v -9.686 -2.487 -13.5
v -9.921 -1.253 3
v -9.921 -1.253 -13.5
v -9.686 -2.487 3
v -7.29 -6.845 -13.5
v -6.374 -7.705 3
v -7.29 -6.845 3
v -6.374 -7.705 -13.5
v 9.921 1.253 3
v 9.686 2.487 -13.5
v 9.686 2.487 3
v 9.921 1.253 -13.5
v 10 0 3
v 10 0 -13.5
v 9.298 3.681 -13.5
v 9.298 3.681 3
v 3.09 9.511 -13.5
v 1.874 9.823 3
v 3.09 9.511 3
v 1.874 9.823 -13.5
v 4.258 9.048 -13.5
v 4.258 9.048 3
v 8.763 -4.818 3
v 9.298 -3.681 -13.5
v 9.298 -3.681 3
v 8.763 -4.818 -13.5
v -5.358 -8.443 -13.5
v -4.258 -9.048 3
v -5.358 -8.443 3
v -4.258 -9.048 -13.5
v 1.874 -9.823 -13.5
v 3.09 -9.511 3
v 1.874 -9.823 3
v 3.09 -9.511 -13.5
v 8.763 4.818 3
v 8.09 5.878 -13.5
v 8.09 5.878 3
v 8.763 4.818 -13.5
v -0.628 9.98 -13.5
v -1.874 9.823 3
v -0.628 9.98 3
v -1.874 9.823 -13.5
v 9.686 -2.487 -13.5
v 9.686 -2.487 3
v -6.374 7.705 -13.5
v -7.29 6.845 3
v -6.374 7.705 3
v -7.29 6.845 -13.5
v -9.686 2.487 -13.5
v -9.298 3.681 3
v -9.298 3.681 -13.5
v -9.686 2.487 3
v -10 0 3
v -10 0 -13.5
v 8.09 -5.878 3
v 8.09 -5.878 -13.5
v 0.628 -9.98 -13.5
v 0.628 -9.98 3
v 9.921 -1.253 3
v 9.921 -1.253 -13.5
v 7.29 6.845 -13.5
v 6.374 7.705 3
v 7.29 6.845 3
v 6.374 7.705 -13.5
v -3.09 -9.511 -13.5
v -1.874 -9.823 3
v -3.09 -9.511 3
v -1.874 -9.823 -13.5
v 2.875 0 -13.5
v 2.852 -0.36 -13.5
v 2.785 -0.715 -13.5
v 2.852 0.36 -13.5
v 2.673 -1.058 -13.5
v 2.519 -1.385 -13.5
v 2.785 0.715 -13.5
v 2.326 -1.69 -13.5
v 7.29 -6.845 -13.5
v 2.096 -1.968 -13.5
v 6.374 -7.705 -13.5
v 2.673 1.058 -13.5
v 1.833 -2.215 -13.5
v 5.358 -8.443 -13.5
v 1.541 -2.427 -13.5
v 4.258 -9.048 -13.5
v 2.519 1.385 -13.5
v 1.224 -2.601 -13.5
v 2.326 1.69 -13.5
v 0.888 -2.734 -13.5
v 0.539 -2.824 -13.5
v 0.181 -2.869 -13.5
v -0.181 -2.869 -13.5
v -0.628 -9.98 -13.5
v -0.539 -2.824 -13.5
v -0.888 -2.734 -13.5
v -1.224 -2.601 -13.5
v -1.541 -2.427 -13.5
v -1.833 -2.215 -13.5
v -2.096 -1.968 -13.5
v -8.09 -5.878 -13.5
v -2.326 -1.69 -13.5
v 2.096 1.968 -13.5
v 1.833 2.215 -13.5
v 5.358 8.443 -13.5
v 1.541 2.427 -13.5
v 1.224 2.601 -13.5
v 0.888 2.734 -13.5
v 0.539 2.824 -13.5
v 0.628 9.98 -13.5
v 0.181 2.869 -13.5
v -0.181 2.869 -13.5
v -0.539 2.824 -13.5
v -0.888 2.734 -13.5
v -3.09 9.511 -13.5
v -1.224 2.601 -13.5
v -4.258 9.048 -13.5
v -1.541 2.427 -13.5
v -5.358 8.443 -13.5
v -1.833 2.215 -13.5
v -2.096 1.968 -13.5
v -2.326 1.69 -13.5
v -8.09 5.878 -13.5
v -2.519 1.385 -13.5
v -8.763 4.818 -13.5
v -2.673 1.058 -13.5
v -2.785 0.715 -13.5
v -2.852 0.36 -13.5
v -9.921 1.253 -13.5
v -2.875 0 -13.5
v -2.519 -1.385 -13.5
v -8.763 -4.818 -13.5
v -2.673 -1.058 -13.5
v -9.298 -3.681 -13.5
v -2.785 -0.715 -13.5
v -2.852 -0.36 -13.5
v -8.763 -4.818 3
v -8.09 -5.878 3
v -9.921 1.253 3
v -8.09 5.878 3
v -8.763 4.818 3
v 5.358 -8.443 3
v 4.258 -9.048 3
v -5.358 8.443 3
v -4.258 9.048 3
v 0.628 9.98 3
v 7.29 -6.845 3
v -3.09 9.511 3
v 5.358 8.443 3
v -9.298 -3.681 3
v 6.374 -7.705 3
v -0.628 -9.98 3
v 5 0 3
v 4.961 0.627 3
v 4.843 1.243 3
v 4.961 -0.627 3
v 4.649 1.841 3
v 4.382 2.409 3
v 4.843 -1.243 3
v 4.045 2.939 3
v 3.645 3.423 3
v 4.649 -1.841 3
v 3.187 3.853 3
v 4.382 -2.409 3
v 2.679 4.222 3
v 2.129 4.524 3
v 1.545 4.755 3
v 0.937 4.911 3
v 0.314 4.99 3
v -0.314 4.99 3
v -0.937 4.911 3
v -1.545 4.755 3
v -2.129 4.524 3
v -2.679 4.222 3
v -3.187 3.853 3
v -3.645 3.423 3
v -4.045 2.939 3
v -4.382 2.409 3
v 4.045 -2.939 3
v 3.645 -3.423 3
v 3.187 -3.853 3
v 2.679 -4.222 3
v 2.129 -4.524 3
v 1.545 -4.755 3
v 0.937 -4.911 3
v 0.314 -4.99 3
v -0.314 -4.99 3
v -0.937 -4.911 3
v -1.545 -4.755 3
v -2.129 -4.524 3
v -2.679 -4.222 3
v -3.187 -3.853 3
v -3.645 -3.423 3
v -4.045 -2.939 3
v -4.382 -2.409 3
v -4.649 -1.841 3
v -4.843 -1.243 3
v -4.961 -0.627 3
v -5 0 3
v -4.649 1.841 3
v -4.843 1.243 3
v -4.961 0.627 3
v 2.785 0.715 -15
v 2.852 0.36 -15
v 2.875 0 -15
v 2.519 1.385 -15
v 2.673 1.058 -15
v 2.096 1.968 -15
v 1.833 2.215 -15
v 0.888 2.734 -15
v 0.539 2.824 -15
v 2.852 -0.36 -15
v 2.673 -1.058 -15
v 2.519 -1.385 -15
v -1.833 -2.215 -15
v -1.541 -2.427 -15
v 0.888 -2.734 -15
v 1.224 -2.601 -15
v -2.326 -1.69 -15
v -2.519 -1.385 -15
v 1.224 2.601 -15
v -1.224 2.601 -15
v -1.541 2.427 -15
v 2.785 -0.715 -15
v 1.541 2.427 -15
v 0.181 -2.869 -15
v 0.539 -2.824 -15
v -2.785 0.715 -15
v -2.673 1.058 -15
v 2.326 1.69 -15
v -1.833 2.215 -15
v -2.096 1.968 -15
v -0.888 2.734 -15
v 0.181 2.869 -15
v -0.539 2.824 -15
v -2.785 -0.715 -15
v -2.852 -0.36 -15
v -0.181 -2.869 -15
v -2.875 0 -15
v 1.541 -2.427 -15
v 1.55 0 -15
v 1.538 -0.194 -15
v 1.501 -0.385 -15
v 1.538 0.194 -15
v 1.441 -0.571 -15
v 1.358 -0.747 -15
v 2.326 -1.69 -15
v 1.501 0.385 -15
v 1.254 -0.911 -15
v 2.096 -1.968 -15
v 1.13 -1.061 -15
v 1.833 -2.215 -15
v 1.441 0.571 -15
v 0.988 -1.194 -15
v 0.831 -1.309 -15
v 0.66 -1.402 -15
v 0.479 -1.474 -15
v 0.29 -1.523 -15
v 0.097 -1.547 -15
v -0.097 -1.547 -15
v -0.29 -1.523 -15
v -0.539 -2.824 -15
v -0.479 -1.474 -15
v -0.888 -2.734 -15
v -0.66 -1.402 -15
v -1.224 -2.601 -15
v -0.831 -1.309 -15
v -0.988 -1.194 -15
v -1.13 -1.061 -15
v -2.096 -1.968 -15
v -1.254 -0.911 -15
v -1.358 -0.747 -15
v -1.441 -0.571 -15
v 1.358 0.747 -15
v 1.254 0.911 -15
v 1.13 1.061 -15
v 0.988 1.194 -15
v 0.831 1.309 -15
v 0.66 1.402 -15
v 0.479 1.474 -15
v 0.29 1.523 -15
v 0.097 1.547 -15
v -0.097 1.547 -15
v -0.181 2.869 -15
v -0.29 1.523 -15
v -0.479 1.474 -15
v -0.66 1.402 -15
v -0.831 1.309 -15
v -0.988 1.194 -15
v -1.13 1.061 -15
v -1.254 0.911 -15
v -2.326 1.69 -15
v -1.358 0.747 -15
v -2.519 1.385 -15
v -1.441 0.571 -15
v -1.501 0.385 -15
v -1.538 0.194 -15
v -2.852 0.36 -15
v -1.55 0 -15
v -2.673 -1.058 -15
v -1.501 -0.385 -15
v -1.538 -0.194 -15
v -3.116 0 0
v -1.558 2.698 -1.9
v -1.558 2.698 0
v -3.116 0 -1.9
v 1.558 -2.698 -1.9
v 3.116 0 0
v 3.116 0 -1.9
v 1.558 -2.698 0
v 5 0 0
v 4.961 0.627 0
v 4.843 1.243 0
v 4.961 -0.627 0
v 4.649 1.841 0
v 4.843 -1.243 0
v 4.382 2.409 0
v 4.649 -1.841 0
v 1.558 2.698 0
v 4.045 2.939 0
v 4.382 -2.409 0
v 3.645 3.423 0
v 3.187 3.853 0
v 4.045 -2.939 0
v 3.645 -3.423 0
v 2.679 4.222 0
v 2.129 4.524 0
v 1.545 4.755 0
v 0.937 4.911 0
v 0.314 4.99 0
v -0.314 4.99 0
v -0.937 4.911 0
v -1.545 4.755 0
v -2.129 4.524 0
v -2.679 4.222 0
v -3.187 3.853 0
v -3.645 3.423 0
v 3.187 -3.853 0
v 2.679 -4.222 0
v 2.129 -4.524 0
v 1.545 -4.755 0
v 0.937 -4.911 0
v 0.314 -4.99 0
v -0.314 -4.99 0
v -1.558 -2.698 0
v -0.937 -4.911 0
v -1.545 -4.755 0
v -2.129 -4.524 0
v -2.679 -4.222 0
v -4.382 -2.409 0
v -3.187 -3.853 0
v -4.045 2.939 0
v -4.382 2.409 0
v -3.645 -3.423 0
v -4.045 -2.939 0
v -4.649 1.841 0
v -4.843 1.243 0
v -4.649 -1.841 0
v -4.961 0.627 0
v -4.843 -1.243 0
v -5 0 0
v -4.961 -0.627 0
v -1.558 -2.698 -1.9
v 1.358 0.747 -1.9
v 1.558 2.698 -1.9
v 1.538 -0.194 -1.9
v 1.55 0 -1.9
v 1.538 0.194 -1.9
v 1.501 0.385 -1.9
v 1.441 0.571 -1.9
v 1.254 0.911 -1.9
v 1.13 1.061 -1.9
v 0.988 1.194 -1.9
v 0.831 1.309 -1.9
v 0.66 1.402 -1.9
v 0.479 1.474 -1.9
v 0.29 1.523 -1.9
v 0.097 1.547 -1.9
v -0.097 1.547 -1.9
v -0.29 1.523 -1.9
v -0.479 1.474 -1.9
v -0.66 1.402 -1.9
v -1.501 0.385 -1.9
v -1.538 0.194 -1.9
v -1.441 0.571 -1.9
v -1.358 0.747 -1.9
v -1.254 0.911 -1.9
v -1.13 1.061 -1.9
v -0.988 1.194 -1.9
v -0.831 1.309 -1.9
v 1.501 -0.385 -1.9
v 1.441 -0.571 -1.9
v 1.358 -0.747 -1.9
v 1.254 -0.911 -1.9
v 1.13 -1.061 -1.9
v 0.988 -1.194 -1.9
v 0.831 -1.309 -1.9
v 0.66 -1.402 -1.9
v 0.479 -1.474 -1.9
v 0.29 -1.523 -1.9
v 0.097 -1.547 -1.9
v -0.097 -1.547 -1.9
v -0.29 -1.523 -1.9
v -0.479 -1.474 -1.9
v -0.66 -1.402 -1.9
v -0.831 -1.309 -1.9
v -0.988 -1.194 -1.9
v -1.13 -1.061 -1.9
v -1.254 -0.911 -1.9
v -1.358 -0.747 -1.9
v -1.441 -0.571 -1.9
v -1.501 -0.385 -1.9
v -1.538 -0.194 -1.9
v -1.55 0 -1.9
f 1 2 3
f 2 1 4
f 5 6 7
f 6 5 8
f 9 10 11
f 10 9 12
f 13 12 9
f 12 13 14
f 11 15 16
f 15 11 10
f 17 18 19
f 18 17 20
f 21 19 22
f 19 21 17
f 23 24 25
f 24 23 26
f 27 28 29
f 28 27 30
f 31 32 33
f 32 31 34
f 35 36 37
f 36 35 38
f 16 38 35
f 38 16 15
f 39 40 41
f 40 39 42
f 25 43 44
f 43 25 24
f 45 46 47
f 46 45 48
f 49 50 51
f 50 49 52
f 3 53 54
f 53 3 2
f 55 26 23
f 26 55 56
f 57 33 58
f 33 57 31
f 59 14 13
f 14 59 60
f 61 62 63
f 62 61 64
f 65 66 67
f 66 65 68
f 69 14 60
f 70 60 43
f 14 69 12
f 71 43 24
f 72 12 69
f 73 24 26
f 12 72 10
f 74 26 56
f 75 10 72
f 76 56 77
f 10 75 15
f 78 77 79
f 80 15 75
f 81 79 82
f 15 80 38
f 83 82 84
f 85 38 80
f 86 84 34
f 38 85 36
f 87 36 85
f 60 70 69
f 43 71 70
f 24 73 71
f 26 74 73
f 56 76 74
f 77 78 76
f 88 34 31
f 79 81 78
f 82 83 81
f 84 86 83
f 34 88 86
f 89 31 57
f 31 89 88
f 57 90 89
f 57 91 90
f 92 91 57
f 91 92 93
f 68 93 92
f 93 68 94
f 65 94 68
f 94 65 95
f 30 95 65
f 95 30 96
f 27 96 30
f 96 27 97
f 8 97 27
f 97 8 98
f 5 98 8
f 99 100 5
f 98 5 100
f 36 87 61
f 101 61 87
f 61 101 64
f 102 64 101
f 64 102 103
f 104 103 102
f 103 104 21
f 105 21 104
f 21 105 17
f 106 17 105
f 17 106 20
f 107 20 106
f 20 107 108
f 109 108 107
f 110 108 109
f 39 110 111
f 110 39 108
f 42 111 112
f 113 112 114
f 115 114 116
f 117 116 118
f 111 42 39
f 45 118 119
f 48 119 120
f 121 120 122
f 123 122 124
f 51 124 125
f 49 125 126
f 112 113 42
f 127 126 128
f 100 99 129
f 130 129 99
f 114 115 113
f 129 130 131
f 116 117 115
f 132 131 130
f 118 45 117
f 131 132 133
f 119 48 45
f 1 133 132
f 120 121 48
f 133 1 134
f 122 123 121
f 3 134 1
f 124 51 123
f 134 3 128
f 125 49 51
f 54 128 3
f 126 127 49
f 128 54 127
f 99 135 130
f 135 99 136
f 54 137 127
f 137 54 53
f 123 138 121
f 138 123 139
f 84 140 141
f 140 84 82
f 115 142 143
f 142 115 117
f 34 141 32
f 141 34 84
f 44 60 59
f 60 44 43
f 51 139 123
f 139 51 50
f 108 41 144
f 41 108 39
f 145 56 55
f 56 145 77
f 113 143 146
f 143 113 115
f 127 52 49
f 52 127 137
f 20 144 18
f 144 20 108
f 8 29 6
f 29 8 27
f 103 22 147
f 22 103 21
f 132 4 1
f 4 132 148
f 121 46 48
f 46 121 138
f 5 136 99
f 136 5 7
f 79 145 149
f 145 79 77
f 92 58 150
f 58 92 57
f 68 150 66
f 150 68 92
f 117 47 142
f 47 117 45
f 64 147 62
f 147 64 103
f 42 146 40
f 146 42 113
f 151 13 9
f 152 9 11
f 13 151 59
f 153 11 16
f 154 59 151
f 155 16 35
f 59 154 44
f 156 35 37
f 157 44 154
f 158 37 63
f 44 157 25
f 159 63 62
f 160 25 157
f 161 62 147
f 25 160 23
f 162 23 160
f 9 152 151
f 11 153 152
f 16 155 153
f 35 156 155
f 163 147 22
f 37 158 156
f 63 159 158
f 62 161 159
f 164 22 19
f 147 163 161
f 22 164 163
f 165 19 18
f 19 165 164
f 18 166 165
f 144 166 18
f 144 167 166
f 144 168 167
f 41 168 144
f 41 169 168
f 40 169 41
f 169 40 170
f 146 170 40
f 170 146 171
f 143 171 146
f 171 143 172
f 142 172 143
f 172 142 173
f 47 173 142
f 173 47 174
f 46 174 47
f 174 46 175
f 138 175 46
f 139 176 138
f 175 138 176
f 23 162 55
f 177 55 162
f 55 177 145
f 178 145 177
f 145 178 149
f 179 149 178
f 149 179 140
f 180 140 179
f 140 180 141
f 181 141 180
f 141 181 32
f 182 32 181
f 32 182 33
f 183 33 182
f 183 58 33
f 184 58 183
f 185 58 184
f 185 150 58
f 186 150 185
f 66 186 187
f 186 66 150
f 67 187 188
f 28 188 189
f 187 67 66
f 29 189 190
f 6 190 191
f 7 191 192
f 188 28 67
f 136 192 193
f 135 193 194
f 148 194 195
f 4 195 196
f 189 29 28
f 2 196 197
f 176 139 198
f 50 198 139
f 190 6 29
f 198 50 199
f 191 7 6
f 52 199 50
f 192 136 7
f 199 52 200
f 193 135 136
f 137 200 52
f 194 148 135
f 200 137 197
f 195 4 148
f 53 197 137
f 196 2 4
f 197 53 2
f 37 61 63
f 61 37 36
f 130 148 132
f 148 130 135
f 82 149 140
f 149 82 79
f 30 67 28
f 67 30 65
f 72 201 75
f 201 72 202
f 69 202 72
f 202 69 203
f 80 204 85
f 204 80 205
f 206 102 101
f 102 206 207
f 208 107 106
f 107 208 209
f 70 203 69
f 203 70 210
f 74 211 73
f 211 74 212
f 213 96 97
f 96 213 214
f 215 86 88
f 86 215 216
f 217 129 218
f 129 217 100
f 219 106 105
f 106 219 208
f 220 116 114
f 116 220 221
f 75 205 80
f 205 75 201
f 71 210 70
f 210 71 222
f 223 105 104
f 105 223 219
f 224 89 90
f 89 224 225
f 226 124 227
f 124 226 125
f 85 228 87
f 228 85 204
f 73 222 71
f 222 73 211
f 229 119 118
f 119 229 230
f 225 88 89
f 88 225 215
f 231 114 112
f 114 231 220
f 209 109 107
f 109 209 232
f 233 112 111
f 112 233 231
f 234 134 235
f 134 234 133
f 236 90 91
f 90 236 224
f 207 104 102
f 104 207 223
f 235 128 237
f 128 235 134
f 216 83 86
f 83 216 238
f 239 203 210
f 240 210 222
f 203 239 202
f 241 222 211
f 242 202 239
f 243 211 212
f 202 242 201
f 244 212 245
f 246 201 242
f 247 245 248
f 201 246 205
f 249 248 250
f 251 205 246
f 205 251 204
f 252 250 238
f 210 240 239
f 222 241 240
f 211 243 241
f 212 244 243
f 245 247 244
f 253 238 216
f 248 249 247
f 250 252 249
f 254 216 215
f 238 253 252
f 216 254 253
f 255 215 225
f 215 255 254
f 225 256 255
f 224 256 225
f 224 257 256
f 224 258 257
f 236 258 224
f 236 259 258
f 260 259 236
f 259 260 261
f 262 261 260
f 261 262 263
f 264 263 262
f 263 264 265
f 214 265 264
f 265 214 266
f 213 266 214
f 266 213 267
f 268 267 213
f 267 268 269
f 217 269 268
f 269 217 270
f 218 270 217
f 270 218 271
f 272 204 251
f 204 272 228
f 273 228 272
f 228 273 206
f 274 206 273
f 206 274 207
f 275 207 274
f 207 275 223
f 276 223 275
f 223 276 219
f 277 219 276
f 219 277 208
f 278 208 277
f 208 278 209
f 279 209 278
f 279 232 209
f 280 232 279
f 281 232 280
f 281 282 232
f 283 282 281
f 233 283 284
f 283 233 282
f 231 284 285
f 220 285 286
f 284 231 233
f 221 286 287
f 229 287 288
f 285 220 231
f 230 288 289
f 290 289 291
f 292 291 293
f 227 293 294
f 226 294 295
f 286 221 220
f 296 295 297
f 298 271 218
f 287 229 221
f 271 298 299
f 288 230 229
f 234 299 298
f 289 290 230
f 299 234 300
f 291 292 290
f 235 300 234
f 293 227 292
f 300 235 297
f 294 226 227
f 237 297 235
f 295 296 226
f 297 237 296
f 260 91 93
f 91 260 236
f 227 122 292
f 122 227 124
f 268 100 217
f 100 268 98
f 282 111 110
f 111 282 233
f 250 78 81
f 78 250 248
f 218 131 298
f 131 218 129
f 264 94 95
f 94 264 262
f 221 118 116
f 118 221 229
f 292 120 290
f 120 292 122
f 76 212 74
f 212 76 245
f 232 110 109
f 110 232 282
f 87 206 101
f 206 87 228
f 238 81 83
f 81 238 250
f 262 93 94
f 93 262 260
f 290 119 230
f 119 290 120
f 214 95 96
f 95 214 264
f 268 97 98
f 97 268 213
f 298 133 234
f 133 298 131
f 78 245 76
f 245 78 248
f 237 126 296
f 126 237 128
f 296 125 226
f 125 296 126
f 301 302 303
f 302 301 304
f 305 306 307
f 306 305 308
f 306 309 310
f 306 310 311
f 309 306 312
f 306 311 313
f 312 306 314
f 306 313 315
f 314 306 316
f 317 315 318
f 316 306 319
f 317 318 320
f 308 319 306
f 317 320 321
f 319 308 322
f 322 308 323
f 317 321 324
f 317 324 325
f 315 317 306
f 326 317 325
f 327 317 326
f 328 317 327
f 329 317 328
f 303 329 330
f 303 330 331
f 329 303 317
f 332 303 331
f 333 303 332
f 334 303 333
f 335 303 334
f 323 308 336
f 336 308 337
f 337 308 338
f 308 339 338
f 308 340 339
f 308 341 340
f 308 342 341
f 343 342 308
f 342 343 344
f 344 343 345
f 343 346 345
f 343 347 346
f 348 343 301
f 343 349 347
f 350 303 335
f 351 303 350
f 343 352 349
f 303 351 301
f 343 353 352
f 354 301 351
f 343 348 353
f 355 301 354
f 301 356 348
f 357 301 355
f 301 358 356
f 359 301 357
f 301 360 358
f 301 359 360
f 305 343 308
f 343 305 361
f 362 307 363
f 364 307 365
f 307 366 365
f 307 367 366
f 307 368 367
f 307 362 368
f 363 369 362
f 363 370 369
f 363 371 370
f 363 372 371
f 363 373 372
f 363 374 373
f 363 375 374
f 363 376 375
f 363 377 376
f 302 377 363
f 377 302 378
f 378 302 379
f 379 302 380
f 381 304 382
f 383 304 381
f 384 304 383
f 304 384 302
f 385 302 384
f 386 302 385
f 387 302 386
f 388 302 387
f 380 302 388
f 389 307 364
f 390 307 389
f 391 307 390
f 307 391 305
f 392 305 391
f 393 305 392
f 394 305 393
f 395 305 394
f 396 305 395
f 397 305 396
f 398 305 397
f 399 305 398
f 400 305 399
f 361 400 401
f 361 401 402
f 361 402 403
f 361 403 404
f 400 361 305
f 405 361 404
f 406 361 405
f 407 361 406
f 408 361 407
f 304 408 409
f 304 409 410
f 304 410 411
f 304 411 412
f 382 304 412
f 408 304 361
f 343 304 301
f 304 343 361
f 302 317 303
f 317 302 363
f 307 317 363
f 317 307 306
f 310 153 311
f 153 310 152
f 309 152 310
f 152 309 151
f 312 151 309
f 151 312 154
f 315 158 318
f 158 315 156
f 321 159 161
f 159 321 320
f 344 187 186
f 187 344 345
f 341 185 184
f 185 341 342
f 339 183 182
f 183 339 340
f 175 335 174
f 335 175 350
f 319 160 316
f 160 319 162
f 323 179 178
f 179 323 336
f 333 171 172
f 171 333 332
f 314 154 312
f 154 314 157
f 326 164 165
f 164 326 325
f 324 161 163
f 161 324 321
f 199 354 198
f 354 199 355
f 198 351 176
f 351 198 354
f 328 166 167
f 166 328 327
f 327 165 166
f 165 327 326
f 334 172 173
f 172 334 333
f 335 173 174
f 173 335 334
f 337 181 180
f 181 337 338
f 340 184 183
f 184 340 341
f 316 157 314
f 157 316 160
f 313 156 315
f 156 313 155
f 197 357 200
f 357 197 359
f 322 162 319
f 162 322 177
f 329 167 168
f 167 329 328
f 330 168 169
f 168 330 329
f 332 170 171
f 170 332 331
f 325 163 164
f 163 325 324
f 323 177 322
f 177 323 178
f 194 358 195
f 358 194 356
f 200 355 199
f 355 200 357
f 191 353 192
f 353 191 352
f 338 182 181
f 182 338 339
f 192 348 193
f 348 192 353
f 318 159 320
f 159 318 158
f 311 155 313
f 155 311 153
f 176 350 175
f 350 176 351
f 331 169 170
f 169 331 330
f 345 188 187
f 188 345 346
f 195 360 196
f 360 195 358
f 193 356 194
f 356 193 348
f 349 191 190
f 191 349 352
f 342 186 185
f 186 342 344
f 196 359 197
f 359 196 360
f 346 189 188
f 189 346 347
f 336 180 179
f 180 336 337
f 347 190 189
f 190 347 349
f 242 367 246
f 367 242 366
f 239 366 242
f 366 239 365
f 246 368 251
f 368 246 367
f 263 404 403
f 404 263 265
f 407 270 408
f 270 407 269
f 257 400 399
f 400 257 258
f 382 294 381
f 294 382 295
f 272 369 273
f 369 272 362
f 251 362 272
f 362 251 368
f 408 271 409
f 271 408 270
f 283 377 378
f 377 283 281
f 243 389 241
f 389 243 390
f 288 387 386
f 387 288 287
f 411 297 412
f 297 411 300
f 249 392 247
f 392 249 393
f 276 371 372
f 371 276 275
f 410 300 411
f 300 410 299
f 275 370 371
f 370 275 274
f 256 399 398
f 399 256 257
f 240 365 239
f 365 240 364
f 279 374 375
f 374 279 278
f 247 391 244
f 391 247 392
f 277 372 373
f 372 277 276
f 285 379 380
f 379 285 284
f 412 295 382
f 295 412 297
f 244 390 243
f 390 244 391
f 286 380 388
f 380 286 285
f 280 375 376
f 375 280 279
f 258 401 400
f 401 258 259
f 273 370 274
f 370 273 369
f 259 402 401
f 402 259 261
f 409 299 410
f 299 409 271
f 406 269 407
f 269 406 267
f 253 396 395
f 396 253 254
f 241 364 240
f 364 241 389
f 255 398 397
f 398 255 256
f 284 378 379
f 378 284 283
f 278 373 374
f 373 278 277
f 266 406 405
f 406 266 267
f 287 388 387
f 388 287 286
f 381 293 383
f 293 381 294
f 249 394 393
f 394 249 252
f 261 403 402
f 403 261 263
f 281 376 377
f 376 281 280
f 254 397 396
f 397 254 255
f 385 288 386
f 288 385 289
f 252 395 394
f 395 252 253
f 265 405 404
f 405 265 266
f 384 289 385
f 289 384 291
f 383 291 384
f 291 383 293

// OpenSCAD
$fn = 50;

difference() {
	union() {
		translate(v = [0, 0, -13.5]) {
			cylinder(h = 16.5, r = 10.0);
		}
		#translate(v = [0, 0, -15.0]) {
			cylinder(h = 15, r = 2.875);
		}
	}
	union() {
		translate(v = [0, 0, 0]) {
			rotate(a = [0, 0, 0]) {
				difference() {
					union() {
						translate(v = [0, 0, -1.9]) {
							linear_extrude(height = 1.9) {
								polygon(points = [[3.1158, 0.0], [1.5579000000000005, 2.698361953111554], [-1.5578999999999994, 2.6983619531115544], [-3.1158, 3.815754496783323e-16], [-1.5579000000000014, -2.6983619531115535], [1.557899999999998, -2.6983619531115552]]);
							}
						}
					}
					union();
				}
			}
		}
		#cylinder(h = 3, r = 5.0);
		#translate(v = [0, 0, -100.0]) {
			cylinder(h = 200, r = 1.55);
		}
	}
}
